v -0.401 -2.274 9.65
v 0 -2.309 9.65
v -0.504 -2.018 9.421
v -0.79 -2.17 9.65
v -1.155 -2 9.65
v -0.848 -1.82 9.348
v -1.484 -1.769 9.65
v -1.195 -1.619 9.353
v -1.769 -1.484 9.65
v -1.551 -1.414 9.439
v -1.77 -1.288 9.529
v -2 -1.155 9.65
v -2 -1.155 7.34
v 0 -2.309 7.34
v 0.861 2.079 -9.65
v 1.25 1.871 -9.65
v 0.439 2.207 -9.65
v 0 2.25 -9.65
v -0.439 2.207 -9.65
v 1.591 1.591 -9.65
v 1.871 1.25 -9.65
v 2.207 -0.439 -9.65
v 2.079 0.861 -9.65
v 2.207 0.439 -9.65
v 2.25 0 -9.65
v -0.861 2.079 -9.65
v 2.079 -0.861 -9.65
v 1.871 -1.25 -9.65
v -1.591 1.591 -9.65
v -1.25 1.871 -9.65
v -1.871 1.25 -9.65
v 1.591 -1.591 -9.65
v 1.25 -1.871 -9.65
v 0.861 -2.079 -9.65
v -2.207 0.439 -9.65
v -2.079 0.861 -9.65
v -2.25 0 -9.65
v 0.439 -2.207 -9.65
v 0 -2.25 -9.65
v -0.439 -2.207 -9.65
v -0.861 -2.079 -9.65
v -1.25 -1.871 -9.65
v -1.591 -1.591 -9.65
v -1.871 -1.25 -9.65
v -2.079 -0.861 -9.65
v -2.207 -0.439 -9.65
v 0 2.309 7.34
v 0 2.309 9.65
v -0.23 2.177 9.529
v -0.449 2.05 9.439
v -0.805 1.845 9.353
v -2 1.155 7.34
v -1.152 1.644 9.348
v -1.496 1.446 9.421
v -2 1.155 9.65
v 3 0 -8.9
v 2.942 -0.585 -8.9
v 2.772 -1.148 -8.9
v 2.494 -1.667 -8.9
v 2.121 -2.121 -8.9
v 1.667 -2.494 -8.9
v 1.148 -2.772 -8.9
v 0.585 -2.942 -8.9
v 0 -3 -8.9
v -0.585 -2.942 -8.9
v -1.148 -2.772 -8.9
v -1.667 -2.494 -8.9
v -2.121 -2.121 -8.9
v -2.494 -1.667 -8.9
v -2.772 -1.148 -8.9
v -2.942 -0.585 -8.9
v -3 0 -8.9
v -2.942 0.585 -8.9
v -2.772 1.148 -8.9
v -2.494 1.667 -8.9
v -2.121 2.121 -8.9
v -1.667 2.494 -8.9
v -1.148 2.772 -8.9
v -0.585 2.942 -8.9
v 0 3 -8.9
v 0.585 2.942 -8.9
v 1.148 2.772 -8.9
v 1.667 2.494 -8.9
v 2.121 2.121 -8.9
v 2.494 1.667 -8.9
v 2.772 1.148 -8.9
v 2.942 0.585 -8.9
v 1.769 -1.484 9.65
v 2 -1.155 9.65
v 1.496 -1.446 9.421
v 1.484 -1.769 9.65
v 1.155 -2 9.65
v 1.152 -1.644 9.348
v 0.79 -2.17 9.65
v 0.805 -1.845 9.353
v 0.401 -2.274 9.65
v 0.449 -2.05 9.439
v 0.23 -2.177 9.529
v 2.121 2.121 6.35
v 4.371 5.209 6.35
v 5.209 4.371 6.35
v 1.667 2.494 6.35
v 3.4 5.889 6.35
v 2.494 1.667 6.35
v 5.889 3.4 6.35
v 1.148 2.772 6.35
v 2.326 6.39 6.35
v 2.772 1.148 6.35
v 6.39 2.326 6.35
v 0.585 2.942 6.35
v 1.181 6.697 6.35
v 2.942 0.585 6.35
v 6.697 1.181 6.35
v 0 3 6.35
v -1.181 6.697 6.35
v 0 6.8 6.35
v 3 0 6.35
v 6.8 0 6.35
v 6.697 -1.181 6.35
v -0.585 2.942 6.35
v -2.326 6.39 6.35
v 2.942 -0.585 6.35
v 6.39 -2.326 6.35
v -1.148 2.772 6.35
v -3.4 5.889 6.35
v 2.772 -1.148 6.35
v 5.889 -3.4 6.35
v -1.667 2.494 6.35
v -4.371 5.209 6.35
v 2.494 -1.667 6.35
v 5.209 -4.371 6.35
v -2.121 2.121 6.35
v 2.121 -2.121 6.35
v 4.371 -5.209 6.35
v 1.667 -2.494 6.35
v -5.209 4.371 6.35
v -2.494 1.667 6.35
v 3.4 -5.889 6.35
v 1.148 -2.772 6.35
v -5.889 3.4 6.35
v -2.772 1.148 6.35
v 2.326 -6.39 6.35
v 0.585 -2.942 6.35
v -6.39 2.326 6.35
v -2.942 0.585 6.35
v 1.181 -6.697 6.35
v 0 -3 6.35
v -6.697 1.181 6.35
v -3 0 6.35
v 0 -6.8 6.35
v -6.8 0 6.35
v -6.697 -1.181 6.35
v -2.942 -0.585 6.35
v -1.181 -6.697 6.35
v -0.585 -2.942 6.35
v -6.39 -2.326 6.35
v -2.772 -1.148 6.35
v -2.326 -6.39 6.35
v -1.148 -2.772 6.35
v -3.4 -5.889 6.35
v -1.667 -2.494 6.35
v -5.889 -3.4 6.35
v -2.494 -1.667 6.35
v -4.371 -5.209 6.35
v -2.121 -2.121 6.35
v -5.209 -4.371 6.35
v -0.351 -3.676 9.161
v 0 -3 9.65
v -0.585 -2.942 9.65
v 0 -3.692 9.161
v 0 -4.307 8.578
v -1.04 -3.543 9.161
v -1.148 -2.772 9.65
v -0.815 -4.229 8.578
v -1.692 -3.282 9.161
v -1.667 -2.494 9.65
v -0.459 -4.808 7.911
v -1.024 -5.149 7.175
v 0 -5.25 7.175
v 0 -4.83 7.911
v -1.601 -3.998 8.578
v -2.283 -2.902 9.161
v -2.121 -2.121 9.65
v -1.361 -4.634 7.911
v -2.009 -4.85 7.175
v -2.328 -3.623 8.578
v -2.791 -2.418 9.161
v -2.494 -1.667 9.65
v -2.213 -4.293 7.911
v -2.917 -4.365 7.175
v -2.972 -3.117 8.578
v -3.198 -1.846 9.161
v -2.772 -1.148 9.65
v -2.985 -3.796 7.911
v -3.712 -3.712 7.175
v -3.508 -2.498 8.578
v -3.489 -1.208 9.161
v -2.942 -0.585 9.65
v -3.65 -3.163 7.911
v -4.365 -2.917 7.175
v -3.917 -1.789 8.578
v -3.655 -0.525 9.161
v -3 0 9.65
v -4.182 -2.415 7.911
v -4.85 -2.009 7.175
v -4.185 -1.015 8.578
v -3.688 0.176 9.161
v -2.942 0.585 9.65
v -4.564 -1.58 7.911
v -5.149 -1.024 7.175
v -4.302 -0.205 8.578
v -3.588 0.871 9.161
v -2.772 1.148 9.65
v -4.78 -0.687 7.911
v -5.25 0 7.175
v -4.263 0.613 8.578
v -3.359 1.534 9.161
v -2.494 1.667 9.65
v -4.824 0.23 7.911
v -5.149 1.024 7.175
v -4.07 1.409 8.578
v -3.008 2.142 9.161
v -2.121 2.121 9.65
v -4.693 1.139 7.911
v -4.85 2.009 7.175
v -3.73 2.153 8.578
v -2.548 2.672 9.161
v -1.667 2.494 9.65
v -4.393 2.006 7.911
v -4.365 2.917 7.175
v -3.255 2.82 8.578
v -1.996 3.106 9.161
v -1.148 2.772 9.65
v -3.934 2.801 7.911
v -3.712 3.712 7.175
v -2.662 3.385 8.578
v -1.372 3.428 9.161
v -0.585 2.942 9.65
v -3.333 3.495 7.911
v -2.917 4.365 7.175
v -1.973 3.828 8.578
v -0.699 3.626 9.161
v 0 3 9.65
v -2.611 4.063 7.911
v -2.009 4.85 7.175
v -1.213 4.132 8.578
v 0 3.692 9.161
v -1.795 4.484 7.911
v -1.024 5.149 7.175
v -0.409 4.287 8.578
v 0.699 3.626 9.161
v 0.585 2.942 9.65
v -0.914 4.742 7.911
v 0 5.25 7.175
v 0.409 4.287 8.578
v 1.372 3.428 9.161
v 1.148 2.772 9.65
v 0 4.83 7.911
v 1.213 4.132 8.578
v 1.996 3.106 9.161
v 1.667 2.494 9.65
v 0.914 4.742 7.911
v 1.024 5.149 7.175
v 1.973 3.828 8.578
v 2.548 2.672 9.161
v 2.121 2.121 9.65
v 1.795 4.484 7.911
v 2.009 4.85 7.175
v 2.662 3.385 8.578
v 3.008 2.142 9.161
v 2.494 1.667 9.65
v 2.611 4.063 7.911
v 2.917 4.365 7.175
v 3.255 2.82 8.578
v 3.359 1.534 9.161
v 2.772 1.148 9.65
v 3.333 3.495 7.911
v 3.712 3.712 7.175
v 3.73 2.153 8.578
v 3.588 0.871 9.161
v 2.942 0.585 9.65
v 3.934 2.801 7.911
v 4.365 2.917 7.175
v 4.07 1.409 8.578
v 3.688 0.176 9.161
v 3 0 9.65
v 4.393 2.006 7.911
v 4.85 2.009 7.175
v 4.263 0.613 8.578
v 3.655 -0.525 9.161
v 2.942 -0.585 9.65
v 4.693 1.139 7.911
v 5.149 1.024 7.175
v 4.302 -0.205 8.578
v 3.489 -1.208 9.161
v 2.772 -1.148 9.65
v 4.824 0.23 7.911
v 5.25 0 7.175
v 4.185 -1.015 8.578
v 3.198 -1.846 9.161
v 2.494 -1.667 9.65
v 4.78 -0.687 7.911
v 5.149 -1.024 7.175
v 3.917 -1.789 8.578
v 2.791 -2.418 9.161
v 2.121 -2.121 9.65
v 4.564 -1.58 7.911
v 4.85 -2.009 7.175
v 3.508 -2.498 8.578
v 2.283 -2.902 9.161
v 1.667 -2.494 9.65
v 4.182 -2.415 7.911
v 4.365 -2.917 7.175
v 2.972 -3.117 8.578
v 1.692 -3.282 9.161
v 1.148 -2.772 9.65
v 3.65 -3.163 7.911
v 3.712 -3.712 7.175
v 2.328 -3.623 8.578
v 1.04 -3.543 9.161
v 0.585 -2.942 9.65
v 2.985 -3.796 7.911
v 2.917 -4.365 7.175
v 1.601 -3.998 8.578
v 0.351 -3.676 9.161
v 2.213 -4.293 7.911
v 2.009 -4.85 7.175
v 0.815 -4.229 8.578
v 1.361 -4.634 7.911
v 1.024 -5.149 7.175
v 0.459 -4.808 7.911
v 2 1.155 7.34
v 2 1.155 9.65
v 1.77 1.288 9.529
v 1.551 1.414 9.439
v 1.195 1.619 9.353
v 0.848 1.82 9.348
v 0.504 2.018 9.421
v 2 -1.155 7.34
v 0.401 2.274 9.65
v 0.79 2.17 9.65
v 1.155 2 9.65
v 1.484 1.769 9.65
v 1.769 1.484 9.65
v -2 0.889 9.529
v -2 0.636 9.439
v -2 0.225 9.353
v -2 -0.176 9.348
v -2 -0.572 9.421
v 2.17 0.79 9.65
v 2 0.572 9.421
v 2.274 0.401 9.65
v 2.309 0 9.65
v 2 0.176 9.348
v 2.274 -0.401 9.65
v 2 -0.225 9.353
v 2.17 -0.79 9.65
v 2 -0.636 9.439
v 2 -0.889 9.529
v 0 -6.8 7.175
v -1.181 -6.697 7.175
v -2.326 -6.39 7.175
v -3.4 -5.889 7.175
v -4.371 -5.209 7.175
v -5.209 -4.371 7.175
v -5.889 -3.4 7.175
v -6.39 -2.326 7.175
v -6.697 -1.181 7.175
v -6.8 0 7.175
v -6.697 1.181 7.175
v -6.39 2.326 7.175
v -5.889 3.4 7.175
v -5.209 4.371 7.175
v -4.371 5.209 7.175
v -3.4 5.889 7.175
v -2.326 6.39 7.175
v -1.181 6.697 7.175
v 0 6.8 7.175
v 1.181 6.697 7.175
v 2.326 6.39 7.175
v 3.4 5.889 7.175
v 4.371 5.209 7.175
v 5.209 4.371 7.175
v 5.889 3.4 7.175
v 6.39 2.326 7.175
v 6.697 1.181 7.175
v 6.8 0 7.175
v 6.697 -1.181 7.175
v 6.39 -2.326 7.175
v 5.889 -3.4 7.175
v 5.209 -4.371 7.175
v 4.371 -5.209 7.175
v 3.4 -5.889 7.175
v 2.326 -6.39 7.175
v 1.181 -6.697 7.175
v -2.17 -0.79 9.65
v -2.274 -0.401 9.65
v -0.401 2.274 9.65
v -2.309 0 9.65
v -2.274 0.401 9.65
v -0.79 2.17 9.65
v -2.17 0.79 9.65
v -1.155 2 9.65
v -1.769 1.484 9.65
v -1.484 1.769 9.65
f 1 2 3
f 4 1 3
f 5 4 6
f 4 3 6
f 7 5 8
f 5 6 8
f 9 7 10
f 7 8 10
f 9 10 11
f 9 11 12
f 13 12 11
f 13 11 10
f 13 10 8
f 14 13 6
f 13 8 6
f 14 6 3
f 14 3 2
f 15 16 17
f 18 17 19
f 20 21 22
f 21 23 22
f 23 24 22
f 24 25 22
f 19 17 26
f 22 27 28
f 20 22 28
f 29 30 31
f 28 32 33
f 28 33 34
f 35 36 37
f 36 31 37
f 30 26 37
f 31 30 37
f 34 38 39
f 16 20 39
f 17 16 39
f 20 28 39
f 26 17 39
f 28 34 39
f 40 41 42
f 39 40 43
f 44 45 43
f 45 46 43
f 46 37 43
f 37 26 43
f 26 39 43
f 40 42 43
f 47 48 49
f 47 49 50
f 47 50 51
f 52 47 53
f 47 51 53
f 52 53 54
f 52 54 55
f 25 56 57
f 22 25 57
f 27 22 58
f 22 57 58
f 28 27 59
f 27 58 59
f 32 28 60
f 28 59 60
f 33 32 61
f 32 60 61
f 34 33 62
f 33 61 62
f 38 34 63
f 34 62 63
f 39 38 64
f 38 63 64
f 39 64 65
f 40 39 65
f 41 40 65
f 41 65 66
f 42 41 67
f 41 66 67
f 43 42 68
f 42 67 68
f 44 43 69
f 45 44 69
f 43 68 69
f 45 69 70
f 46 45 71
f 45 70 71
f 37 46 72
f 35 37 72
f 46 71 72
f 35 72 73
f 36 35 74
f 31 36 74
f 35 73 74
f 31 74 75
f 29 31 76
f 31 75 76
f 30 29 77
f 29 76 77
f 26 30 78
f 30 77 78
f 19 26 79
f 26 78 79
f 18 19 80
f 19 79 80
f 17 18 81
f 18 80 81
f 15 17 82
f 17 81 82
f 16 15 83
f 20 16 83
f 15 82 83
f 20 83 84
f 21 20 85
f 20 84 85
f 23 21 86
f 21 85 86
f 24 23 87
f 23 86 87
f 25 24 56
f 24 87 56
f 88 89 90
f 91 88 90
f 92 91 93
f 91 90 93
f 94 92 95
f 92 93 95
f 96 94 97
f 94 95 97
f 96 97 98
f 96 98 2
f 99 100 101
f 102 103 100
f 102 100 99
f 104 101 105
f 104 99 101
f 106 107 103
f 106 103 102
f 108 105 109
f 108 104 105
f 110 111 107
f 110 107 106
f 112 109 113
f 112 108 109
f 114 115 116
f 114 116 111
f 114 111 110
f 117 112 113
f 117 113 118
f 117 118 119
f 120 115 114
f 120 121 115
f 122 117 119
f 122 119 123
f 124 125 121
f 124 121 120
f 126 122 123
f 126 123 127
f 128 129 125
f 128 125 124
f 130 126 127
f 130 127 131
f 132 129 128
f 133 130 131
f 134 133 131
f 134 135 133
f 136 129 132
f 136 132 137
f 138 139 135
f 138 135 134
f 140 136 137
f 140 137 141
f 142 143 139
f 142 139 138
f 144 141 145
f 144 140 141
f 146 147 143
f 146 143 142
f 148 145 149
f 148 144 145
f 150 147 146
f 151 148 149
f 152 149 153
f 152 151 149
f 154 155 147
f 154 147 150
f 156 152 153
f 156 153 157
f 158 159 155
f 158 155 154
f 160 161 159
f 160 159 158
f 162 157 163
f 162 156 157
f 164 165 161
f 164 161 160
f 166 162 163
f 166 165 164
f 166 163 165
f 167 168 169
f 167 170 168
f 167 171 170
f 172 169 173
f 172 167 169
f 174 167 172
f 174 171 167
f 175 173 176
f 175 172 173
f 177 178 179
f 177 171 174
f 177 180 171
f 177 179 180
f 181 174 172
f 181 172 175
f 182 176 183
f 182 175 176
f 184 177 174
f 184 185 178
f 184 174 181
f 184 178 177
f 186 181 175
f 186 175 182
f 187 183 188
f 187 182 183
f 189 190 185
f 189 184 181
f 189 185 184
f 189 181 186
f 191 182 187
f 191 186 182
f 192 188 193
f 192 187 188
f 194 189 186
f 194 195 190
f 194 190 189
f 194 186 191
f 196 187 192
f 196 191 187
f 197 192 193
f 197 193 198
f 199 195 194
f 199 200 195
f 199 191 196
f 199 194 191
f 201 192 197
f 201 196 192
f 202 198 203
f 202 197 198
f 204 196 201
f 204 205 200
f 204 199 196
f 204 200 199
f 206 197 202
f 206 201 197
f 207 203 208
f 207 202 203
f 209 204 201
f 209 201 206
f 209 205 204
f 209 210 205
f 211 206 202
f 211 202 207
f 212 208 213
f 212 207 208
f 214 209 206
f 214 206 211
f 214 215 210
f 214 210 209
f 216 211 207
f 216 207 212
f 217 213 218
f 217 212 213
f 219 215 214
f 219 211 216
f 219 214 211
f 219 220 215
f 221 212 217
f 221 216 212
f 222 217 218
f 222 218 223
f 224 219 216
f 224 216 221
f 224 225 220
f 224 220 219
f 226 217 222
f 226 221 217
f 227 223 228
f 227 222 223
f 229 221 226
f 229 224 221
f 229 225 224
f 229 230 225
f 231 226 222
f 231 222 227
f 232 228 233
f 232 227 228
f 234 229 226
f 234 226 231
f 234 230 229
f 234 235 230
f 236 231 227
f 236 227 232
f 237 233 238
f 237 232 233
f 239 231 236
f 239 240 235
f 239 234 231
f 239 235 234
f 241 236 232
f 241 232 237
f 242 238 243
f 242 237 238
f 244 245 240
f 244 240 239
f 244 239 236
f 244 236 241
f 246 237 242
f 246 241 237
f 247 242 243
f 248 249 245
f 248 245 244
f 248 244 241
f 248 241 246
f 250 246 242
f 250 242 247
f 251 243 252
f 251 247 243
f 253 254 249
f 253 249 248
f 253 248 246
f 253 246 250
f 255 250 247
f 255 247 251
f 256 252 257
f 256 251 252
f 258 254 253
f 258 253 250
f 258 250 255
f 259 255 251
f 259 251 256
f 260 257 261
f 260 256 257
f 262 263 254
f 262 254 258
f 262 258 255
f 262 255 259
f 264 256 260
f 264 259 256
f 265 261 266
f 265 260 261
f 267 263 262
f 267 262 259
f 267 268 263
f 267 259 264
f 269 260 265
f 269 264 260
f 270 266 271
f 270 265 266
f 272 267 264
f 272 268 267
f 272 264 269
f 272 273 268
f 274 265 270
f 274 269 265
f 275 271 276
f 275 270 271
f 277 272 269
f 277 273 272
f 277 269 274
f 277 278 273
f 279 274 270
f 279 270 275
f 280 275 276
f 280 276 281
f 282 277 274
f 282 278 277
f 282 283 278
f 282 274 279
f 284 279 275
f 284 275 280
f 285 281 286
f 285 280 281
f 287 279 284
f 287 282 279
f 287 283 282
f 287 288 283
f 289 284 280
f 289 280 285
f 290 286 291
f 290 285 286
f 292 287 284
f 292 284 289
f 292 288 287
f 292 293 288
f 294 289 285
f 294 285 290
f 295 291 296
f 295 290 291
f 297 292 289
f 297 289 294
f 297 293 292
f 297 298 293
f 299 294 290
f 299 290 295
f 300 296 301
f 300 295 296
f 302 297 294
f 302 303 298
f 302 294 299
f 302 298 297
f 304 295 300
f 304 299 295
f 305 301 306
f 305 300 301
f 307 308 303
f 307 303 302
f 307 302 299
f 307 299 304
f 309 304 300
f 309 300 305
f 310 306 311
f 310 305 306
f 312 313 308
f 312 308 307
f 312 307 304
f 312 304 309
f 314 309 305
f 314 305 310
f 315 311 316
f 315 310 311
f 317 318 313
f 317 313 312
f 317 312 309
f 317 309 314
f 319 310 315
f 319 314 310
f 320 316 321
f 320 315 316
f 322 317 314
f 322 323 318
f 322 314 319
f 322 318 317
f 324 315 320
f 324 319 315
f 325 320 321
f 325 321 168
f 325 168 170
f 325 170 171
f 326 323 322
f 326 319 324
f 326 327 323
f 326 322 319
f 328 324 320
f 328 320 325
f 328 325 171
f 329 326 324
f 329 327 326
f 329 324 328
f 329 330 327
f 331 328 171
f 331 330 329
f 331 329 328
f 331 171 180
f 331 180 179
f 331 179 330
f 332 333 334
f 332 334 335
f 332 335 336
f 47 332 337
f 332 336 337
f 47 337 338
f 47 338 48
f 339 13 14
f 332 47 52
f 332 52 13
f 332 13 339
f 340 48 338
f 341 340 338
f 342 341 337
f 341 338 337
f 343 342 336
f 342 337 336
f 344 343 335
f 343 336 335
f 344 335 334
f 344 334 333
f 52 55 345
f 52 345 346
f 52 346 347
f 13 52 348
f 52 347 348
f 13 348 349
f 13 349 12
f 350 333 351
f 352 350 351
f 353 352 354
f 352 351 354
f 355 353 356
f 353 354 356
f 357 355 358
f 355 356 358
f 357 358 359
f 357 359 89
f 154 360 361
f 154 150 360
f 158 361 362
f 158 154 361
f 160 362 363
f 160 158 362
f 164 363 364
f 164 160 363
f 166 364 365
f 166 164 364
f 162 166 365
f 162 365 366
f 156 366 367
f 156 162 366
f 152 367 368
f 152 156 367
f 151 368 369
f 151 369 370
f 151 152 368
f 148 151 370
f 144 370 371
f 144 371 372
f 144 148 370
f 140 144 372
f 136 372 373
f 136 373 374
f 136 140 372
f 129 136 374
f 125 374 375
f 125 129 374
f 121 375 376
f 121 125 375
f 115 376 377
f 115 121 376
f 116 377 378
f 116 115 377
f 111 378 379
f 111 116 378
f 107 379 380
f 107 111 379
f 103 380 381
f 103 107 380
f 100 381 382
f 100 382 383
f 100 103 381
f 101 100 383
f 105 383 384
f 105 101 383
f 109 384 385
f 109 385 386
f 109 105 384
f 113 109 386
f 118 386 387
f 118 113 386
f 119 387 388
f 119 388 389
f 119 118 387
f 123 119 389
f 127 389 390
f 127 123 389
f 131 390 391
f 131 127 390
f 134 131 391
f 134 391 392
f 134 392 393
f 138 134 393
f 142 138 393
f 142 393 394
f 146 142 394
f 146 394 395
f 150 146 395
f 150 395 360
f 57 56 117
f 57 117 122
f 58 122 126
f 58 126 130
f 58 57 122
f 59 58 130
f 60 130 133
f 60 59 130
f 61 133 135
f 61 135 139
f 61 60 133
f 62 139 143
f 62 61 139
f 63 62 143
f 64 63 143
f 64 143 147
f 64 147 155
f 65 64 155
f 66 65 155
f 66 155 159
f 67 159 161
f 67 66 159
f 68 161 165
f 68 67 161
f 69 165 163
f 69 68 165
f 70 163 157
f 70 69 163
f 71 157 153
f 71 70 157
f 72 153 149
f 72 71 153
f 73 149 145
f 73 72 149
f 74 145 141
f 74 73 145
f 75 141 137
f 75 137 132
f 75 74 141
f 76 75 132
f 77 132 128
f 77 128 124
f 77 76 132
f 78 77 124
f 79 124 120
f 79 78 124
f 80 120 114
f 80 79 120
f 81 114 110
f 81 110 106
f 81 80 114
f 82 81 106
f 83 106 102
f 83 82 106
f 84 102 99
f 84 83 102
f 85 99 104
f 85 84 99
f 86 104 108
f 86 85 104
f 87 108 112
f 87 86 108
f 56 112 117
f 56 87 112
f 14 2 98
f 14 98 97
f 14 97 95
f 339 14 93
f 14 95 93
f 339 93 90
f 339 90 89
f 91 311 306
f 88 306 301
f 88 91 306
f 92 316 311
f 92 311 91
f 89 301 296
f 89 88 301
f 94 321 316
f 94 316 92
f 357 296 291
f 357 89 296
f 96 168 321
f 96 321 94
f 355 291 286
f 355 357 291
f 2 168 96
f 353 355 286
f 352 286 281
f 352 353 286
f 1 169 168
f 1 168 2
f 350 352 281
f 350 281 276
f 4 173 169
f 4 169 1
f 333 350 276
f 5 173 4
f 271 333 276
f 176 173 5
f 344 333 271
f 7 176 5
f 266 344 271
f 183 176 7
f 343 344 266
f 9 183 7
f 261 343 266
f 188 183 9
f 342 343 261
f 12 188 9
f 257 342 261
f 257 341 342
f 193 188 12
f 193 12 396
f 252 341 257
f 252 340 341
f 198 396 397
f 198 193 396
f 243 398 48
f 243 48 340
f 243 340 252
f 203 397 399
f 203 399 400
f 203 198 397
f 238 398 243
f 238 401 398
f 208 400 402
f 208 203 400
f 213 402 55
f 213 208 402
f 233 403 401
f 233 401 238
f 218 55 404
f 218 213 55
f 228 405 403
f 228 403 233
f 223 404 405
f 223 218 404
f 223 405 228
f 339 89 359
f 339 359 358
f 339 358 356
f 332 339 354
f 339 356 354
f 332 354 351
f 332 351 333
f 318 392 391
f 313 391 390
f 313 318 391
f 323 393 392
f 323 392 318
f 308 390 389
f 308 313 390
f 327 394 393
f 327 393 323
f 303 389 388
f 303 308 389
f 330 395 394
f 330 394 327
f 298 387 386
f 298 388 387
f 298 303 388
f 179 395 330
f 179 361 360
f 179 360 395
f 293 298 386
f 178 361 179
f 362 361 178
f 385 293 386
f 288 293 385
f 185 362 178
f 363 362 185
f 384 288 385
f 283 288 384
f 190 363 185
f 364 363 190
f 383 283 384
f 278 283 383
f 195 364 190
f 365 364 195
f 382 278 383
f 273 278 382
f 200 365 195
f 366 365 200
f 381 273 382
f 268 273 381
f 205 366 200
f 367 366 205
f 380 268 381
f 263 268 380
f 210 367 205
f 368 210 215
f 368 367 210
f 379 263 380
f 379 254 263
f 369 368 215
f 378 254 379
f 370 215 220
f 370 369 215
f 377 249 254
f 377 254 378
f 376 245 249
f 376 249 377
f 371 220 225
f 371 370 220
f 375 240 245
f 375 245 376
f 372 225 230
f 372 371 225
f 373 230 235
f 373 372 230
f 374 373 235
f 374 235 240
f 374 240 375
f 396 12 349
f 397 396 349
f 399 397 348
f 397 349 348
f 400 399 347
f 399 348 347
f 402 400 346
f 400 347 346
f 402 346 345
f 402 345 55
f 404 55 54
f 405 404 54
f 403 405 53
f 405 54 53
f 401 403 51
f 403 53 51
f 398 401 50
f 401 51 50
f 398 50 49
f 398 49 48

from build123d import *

# Parameters (mm, degrees)
SKETCH13_W         = 16
SKETCH13_H         = 3
CHAMFER1_SIZE      = 0.75
CUT_EXTRUDE2_DEPTH = 2.31


with BuildPart() as part:
    # Sketch13 → Revolve1 (revolve)
    with BuildSketch(Plane(origin=(0, 0, 0), x_dir=(0, 0, -1), z_dir=(1, 0, 0)), mode=Mode.PRIVATE) as revolve1_sk:
        with Locations((1.65, 1.5)):
            Rectangle(SKETCH13_W, SKETCH13_H)
    revolve(revolve1_sk.sketch.rotate(Axis((0, 0, 9.65), (0, 0, -1)), 90), axis=Axis((0, 0, 9.65), (0, 0, -1)))

    # Chamfer1
    chamfer1_edges = [part.edges().sort_by_distance(p)[0] for p in [
        (-3, 0, -9.65),
    ]]
    chamfer(chamfer1_edges, length=CHAMFER1_SIZE)

    # Sketch7 → Revolve2 (revolve)
    with BuildSketch(Plane(origin=(0, 0, 0), x_dir=(0, 0, -1), z_dir=(1, 0, 0)), mode=Mode.PRIVATE) as revolve2_sk:
        with BuildLine():
            Line((-6.35, 5.25), (-6.35, 0))
            Line((-6.35, 0), (-9.65, 0))
            Line((-9.65, 0), (-9.65, 3))
            ThreePointArc((-9.65, 3), (-8.577614941, 4.306626435), (-7.175, 5.25))
            Line((-7.175, 5.25), (-7.175, 6.8))
            Line((-7.175, 6.8), (-6.35, 6.8))
            Line((-6.35, 6.8), (-6.35, 5.25))
        make_face()
    revolve(revolve2_sk.sketch.rotate(Axis((0, 0, 9.65), (0, 0, -1)), 180), axis=Axis((0, 0, 9.65), (0, 0, -1)))

    # Sketch5 → Cut-Extrude2 (cut)
    with BuildSketch(Plane.XY.offset(9.65)):
        Polygon((2, -1.154700538), (2, 1.154700538), (0, 2.309401077), (-2, 1.154700538), (-2, -1.154700538), (0, -2.309401077), align=None)
    extrude(amount=-CUT_EXTRUDE2_DEPTH, mode=Mode.SUBTRACT)

    # Cut-Extrude3 cone 1 section (through the dimple's axis) → Cut-Extrude3 (revolve, cut)
    with BuildSketch(Plane(origin=(0, 0, 9.65), x_dir=(0, -1, 0), z_dir=(1, 0, 0))):
        Polygon((0, 0), (2.309401077, 0), (0, 2.309401077), align=None)
    revolve(axis=Axis((0, 0, 9.65), (0, 0, -1)), mode=Mode.SUBTRACT)


solid = part.part
